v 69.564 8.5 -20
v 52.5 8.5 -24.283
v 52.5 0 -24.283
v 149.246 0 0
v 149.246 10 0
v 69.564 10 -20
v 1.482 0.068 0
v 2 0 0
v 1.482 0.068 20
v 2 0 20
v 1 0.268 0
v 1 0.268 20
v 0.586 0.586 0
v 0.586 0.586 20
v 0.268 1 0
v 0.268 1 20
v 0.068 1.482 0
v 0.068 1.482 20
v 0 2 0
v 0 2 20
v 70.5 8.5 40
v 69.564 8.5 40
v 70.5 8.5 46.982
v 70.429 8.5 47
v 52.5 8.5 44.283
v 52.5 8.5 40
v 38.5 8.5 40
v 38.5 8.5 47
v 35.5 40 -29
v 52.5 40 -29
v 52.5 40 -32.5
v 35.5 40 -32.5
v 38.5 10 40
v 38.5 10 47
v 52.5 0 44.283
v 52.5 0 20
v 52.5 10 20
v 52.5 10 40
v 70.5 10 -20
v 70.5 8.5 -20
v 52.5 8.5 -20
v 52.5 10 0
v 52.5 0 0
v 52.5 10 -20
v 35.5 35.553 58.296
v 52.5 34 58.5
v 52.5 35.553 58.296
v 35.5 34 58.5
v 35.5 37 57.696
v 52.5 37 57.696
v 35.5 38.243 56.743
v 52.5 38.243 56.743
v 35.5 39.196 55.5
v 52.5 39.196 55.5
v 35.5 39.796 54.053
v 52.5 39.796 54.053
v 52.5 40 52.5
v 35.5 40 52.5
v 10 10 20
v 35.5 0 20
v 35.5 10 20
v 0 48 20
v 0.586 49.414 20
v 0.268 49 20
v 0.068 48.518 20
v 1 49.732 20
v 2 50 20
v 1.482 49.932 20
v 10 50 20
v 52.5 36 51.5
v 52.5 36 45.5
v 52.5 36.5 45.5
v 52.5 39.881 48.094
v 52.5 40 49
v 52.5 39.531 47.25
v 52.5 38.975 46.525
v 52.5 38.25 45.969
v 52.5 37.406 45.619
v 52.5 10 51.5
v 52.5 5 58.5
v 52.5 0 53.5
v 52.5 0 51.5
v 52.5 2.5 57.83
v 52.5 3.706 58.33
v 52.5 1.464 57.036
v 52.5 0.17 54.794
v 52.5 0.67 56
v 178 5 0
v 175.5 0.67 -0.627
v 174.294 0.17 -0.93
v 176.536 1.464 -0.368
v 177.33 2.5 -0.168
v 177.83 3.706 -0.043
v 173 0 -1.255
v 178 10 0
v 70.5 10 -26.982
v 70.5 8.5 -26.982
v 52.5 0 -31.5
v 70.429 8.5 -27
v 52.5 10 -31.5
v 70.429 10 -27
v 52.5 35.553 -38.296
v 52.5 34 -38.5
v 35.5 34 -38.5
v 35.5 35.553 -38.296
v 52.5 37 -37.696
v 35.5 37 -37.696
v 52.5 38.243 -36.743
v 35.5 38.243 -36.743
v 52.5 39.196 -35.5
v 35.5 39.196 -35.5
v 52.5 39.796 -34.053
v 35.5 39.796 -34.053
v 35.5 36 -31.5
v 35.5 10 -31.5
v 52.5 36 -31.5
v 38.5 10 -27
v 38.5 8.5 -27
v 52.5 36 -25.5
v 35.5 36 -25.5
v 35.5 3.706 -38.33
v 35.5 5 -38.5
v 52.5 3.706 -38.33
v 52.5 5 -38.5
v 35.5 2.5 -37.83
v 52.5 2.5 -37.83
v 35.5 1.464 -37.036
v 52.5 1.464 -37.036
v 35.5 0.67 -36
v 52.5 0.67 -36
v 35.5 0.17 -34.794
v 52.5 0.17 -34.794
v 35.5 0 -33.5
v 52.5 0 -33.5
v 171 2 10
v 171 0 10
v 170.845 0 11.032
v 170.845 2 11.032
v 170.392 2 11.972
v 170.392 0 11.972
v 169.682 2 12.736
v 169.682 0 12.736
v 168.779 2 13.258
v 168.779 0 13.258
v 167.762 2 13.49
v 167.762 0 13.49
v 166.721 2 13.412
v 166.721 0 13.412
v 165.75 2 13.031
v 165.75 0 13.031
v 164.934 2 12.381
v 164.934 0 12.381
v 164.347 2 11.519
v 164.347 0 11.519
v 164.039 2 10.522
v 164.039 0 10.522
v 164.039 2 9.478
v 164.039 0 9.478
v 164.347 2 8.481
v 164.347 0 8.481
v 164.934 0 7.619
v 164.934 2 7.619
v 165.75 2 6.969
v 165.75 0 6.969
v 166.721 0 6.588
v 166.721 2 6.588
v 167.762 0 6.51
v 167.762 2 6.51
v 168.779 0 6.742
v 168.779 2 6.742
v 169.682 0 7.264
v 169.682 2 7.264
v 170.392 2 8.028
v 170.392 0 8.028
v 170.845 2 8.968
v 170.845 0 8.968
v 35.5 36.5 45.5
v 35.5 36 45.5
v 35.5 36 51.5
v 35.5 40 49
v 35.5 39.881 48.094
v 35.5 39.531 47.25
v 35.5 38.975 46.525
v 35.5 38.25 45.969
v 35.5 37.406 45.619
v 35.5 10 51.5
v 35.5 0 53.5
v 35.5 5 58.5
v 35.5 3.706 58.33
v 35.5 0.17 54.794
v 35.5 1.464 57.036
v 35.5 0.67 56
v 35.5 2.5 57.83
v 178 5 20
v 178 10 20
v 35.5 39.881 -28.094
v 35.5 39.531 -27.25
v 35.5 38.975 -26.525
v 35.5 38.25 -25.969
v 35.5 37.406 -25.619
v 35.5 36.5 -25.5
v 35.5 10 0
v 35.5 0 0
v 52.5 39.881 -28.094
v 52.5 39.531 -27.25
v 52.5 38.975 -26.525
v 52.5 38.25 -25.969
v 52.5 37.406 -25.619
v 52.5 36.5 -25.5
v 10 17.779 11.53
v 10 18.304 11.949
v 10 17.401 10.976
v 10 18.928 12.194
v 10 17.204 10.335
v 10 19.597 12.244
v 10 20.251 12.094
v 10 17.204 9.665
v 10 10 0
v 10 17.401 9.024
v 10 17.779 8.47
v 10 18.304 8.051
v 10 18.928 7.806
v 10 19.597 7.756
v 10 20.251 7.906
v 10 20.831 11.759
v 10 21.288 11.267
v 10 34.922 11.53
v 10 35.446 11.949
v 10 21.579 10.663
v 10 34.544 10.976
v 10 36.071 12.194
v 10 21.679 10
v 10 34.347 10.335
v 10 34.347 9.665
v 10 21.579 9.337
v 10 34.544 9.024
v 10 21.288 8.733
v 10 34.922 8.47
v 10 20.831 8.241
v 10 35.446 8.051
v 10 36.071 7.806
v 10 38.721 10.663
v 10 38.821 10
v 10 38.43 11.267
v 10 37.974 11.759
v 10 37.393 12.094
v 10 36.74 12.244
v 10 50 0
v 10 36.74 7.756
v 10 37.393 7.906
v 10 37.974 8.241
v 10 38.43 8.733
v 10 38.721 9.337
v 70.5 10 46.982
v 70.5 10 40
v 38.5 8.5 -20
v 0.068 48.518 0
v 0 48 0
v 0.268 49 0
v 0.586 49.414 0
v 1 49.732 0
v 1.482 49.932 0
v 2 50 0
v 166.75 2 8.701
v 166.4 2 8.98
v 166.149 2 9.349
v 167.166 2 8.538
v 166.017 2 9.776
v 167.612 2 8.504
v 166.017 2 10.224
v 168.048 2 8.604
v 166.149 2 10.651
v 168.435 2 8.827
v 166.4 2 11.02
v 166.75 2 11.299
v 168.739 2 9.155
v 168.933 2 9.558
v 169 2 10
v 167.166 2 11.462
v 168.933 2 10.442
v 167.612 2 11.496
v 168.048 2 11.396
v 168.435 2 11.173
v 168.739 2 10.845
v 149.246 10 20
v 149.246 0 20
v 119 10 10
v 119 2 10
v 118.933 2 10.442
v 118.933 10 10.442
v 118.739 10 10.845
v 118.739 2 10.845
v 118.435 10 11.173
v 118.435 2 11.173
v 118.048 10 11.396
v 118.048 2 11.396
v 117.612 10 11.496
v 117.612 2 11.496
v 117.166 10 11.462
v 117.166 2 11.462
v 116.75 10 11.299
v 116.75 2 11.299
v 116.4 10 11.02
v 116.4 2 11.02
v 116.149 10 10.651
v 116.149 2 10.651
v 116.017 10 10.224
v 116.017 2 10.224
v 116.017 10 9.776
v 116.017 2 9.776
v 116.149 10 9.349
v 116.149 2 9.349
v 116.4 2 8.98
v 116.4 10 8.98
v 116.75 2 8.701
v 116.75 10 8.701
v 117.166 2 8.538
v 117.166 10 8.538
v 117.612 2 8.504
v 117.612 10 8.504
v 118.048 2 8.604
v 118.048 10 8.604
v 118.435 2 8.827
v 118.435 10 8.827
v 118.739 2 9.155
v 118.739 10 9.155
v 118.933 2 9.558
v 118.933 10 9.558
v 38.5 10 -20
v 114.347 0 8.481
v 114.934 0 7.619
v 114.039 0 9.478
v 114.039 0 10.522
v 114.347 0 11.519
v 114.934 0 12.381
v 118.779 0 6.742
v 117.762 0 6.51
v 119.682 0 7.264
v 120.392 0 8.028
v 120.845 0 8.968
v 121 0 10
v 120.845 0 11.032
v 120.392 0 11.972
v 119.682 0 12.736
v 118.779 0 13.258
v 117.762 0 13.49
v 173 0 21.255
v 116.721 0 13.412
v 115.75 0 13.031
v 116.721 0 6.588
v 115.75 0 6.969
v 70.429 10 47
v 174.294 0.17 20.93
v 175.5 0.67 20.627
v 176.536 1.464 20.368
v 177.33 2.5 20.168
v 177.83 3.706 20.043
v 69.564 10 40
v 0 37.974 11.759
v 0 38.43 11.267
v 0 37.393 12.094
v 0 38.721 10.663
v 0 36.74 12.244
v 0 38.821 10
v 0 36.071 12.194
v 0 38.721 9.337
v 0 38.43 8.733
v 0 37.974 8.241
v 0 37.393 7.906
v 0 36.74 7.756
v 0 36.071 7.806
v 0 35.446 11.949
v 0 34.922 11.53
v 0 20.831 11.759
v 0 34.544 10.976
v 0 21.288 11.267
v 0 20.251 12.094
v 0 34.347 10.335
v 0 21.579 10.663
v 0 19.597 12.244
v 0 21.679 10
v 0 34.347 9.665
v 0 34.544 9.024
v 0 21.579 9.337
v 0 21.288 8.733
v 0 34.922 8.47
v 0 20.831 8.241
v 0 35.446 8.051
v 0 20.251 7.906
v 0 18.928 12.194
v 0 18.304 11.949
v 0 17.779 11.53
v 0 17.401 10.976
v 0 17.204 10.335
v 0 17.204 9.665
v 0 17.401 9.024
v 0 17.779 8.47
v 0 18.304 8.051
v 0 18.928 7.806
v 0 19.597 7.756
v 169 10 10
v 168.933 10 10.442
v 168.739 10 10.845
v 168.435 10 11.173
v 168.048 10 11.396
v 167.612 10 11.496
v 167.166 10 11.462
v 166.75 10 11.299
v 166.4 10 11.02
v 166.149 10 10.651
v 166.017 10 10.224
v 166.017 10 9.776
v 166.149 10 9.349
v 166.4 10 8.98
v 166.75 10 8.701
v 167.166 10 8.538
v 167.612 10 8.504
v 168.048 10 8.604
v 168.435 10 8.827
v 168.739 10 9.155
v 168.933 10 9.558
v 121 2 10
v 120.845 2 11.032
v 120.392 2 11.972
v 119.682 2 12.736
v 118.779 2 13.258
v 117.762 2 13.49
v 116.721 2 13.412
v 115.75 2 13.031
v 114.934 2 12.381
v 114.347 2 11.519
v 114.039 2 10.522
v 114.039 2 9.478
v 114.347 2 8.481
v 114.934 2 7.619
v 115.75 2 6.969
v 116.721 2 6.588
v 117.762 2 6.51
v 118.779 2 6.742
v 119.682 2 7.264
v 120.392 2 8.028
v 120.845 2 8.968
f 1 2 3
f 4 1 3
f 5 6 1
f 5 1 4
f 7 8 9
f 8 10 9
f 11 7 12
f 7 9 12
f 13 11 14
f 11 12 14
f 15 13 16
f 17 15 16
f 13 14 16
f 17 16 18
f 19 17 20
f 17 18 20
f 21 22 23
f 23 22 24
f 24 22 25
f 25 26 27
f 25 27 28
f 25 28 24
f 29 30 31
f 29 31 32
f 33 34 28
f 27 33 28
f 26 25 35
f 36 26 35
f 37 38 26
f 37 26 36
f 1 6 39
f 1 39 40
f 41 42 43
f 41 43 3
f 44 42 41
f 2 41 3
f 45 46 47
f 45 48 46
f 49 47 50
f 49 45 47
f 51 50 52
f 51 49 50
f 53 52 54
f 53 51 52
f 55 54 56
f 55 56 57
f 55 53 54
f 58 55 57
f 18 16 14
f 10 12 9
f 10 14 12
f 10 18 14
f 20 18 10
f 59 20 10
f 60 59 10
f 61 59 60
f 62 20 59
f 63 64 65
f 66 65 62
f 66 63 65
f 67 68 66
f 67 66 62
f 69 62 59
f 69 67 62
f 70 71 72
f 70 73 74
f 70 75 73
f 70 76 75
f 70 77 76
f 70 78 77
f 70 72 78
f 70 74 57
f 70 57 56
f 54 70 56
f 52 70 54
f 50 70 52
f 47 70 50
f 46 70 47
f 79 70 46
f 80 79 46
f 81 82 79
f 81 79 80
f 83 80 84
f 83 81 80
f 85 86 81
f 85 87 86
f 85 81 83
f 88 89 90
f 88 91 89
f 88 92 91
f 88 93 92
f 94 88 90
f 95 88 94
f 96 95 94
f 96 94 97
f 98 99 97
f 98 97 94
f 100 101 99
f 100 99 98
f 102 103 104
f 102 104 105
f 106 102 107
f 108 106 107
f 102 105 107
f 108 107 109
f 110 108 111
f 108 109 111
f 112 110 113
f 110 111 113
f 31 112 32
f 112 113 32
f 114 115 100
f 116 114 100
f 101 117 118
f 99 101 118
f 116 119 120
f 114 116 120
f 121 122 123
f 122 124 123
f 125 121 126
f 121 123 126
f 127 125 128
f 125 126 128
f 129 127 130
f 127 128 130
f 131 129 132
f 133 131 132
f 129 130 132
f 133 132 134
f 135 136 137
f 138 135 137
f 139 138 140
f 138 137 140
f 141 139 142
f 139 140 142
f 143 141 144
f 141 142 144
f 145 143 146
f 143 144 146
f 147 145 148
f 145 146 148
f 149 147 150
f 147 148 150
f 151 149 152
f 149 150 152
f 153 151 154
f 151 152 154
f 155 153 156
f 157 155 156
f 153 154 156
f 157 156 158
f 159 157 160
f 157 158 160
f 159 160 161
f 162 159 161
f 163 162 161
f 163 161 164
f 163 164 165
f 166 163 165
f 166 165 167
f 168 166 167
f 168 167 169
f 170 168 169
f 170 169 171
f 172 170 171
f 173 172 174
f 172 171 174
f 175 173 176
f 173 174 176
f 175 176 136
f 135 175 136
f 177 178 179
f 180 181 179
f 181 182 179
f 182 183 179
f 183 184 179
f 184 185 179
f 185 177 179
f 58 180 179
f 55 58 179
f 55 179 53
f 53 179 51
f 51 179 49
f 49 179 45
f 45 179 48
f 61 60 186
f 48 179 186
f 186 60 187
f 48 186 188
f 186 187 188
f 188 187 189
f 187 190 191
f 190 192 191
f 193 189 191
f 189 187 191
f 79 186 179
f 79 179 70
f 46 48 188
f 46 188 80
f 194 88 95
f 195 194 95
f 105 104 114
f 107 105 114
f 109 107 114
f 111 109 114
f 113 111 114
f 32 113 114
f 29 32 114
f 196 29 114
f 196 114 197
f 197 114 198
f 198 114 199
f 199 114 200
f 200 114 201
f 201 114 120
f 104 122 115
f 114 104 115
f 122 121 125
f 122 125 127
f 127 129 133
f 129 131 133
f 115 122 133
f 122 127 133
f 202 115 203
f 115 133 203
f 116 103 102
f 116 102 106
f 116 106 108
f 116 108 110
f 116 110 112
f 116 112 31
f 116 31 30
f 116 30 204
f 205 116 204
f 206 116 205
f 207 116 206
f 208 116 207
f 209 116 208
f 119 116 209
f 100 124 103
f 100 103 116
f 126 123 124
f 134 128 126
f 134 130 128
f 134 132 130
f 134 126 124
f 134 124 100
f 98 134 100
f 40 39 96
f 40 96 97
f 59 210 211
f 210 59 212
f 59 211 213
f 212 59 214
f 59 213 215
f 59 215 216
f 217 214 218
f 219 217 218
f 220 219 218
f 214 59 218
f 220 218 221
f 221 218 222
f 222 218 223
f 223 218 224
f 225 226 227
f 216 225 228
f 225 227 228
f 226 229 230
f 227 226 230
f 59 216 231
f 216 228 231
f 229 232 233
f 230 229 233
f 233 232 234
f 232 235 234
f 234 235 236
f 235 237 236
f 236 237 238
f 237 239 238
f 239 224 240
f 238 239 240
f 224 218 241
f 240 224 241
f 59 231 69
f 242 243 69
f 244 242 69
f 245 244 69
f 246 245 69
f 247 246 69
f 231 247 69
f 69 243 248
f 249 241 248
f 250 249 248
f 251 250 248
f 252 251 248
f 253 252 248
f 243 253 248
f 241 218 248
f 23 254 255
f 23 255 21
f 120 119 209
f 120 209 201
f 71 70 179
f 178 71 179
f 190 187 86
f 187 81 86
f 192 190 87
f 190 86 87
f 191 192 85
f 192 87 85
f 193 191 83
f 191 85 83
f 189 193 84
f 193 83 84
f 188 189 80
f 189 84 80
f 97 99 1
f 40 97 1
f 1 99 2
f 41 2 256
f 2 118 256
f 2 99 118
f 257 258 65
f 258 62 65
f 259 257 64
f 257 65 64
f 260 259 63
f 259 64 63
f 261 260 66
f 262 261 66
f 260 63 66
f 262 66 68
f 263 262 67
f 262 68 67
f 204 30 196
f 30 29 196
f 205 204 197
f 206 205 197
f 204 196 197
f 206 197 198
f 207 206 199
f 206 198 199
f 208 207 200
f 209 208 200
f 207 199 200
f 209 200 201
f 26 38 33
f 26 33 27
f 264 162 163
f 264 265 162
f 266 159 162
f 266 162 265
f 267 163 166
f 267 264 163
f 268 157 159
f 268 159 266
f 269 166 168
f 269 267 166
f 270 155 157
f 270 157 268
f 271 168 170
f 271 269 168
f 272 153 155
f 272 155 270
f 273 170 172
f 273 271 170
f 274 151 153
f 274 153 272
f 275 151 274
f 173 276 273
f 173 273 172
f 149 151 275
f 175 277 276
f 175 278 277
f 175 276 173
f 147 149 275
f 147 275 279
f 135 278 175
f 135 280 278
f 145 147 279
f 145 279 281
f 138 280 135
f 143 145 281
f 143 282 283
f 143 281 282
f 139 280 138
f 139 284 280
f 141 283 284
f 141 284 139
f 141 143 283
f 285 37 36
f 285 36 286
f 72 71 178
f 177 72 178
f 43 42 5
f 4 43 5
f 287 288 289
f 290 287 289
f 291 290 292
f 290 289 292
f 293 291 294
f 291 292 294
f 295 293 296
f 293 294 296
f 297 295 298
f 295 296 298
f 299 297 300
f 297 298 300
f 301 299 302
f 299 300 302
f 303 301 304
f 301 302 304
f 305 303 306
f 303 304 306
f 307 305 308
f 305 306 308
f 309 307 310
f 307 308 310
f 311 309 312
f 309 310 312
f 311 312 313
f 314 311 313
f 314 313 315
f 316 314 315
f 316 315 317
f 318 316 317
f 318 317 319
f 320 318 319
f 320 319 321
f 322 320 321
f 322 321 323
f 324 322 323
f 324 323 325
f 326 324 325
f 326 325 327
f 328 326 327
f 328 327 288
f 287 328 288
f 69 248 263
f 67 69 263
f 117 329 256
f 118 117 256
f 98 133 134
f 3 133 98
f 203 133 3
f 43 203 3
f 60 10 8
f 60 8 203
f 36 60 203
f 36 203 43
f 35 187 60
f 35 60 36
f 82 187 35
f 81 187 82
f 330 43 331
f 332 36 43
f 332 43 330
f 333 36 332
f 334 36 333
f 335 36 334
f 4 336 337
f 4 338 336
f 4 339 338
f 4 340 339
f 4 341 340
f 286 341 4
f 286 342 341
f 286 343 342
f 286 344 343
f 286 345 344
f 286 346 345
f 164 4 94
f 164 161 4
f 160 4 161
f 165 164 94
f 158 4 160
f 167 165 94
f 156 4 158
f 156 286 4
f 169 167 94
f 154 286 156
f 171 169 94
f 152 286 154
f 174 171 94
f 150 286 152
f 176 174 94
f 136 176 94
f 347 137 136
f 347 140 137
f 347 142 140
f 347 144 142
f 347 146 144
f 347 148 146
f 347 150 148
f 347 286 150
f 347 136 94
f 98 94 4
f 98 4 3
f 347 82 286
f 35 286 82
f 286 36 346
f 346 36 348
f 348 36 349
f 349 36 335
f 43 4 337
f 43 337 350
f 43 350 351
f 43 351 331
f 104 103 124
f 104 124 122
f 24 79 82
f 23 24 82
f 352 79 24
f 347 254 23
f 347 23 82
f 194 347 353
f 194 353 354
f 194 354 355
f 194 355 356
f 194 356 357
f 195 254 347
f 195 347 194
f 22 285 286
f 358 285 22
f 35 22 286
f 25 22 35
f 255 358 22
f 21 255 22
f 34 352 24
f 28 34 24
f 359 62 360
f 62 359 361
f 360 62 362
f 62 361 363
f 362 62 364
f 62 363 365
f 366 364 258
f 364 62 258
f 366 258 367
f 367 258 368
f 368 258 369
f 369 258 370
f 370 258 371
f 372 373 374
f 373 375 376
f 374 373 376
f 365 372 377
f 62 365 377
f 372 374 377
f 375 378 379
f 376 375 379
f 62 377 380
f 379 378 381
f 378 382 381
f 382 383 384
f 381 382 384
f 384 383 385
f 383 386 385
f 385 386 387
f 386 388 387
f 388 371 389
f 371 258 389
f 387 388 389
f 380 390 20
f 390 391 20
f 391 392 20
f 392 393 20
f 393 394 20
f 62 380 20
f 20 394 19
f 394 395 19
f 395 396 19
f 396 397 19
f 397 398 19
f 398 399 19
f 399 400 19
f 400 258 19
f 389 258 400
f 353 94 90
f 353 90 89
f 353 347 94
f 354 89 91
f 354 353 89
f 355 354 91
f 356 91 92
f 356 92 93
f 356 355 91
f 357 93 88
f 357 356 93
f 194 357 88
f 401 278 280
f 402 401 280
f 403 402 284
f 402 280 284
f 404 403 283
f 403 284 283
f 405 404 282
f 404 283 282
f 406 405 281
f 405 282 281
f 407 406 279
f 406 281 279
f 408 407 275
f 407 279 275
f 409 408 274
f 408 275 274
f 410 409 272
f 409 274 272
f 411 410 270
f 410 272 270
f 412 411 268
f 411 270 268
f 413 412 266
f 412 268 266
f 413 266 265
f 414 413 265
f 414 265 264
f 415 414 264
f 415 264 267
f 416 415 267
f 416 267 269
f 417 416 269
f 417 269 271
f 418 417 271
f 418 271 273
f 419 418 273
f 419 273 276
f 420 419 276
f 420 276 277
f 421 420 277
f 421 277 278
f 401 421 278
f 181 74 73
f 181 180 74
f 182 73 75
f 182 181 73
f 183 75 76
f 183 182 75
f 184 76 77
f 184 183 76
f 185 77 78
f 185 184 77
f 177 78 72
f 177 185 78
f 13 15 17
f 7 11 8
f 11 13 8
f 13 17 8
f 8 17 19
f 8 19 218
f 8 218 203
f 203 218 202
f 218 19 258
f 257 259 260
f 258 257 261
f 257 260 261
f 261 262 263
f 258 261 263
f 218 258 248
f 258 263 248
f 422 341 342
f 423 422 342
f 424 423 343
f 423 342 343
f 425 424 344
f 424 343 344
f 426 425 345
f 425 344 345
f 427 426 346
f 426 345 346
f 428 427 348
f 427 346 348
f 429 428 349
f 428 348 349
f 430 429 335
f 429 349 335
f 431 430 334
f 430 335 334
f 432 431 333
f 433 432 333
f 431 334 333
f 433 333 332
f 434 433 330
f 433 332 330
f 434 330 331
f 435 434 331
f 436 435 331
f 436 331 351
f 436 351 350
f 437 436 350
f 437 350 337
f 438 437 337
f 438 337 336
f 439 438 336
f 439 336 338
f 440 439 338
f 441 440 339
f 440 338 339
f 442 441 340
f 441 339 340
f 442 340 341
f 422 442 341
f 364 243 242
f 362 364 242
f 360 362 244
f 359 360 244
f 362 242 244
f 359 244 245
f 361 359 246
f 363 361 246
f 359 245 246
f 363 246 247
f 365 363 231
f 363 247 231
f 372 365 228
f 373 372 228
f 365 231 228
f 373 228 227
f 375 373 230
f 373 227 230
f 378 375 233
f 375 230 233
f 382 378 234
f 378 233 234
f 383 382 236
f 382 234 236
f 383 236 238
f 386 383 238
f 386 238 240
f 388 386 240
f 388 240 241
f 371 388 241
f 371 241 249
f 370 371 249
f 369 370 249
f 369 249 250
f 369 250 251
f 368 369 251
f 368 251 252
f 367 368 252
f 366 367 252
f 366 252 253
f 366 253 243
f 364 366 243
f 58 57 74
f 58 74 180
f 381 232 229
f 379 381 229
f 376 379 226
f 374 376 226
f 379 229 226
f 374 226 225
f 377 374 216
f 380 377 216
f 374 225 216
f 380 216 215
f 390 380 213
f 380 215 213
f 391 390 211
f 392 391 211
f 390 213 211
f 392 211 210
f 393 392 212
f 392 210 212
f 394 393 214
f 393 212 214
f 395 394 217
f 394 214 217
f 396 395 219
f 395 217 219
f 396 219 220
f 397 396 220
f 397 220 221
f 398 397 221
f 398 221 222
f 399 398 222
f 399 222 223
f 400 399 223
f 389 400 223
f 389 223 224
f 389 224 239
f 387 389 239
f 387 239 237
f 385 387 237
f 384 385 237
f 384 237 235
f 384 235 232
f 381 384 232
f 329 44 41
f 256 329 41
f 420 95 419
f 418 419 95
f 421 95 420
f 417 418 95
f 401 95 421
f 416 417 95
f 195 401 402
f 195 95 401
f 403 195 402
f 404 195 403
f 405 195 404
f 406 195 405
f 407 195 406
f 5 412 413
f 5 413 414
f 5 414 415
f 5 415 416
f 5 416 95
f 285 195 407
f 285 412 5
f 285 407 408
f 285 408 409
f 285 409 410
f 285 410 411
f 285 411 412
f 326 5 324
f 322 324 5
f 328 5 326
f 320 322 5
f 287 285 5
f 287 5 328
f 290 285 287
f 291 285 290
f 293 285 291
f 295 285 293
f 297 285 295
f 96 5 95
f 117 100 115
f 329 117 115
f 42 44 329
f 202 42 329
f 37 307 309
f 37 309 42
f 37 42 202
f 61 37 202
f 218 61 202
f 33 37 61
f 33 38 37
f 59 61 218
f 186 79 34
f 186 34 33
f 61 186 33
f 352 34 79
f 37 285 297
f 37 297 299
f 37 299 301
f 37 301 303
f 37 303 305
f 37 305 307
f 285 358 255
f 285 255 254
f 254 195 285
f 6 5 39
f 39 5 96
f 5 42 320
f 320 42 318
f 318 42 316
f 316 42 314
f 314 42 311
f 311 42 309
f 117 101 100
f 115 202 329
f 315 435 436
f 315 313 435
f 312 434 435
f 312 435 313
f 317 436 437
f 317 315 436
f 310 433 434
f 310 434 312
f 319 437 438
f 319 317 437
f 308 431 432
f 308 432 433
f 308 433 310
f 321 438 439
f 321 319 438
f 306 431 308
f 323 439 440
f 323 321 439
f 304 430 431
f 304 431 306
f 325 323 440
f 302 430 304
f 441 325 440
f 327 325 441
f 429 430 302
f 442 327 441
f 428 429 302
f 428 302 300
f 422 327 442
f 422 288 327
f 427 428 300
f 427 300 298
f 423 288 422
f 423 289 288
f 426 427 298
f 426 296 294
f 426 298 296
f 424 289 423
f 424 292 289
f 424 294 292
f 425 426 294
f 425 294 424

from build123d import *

# Parameters (mm, degrees)
PAD_DEPTH       = 20
SKETCH001_R     = 1.5
POCKET_DEPTH    = 50.001
SKETCH002_R     = 2.25
POCKET001_DEPTH = 10.001
SKETCH003_R     = 3.5
POCKET002_DEPTH = 2
PAD001_DEPTH    = 10
SKETCH006_W     = 17
SKETCH006_H     = 7
PAD002_DEPTH    = 36
SKETCH007_W     = 17
SKETCH007_H     = 13
PAD003_DEPTH    = 4
FILLET_R        = 3.5
FILLET001_R     = 3.5
FILLET002_R     = 6
FILLET003_R     = 6
FILLET004_R     = 5
FILLET005_R     = 5
FILLET006_R     = 5
FILLET007_R     = 2
FILLET008_R     = 2
POCKET003_START = -3
SKETCH008_W     = 1.5
SKETCH008_H     = 7
POCKET003_DEPTH = 32


with BuildPart() as part:
    # Sketch → Pad (new body)
    with BuildSketch(Plane.XY):
        Polygon((0, 50), (0, 0), (178, 0), (178, 10), (10, 10), (10, 50), align=None)
    extrude(amount=PAD_DEPTH)

    # Sketch001 (on Face2 of Pad) → Pocket (cut, through all)
    with BuildSketch(Plane.XZ):
        with Locations((117.5, 10)):
            Circle(SKETCH001_R)
        with Locations((167.5, 10)):
            Circle(SKETCH001_R)
    extrude(amount=-POCKET_DEPTH, mode=Mode.SUBTRACT)

    # Sketch002 (on Face6 of Pocket) → Pocket001 (cut, through all)
    with BuildSketch(Plane.YZ.offset(10)):
        with Locations((19.428571, 10)):
            Circle(SKETCH002_R)
        with Locations((36.571429, 10)):
            Circle(SKETCH002_R)
    extrude(amount=-POCKET001_DEPTH, mode=Mode.SUBTRACT)

    # Sketch003 (on Face5 of Pocket001) → Pocket002 (cut)
    with BuildSketch(Plane.XZ):
        with Locations((117.5, 10)):
            Circle(SKETCH003_R)
        with Locations((167.5, 10)):
            Circle(SKETCH003_R)
    extrude(amount=-POCKET002_DEPTH, mode=Mode.SUBTRACT)

    # Sketch004 (on Face10 of Pocket002) → Pad001 (join)
    with BuildSketch(Plane(origin=(0, 10, 0), x_dir=(-1, 0, 0), z_dir=(0, 1, 0))):
        Polygon((-35.5, 20), (-35.5, 51.5), (-52.5, 51.5), (-178, 20), (-149.246042, 20), (-52.5, 44.282871), (-52.5, 20), align=None)
        Polygon((-52.5, 0), (-52.5, -24.282871), (-149.246042, 0), (-178, 0), (-52.5, -31.5), (-35.5, -31.5), (-35.5, 0), align=None)
    extrude(amount=-PAD001_DEPTH)

    # Sketch006 (on Face15 of Pad001) → Pad002 (join)
    with BuildSketch(Plane.XZ):
        with Locations((44, 55)):
            Rectangle(SKETCH006_W, SKETCH006_H)
        with Locations((44, -35)):
            Rectangle(SKETCH006_W, SKETCH006_H)
    extrude(amount=-PAD002_DEPTH)

    # Sketch007 (on Face31 of Pad002) → Pad003 (join)
    with BuildSketch(Plane(origin=(0, 36, 0), x_dir=(-1, 0, 0), z_dir=(0, 1, 0))):
        with Locations((-44, -32)):
            Rectangle(SKETCH007_W, SKETCH007_H)
        with Locations((-44, 52)):
            Rectangle(SKETCH007_W, SKETCH007_H)
    extrude(amount=PAD003_DEPTH)

    # Fillet
    fillet_edges = [part.edges().sort_by_distance(p)[0] for p in [
        (44, 40, 45.5),
    ]]
    fillet(fillet_edges, radius=FILLET_R)

    # Fillet001
    fillet001_edges = [part.edges().sort_by_distance(p)[0] for p in [
        (44, 40, -25.5),
    ]]
    fillet(fillet001_edges, radius=FILLET001_R)

    # Fillet002
    fillet002_edges = [part.edges().sort_by_distance(p)[0] for p in [
        (44, 40, 58.5),
    ]]
    fillet(fillet002_edges, radius=FILLET002_R)

    # Fillet003
    fillet003_edges = [part.edges().sort_by_distance(p)[0] for p in [
        (44, 40, -38.5),
    ]]
    fillet(fillet003_edges, radius=FILLET003_R)

    # Fillet004
    fillet004_edges = [part.edges().sort_by_distance(p)[0] for p in [
        (44, 0, -38.5),
    ]]
    fillet(fillet004_edges, radius=FILLET004_R)

    # Fillet005
    fillet005_edges = [part.edges().sort_by_distance(p)[0] for p in [
        (44, 0, 58.5),
    ]]
    fillet(fillet005_edges, radius=FILLET005_R)

    # Fillet006
    fillet006_edges = [part.edges().sort_by_distance(p)[0] for p in [
        (178, 0, 10),
    ]]
    fillet(fillet006_edges, radius=FILLET006_R)

    # Fillet007
    fillet007_edges = [part.edges().sort_by_distance(p)[0] for p in [
        (0, 0, 10),
    ]]
    fillet(fillet007_edges, radius=FILLET007_R)

    # Fillet008
    fillet008_edges = [part.edges().sort_by_distance(p)[0] for p in [
        (0, 50, 10),
    ]]
    fillet(fillet008_edges, radius=FILLET008_R)

    # Sketch008 (on Face8 of Fillet008) → Pocket003 (cut)
    with BuildSketch(Plane(origin=(35.5, 0, 0), x_dir=(0, -1, 0), z_dir=(-1, 0, 0)).offset(POCKET003_START)):
        with Locations((-9.25, 43.5)):
            Rectangle(SKETCH008_W, SKETCH008_H)
        with Locations((-9.25, -23.5)):
            Rectangle(SKETCH008_W, SKETCH008_H)
    extrude(amount=-POCKET003_DEPTH, mode=Mode.SUBTRACT)


solid = part.part
